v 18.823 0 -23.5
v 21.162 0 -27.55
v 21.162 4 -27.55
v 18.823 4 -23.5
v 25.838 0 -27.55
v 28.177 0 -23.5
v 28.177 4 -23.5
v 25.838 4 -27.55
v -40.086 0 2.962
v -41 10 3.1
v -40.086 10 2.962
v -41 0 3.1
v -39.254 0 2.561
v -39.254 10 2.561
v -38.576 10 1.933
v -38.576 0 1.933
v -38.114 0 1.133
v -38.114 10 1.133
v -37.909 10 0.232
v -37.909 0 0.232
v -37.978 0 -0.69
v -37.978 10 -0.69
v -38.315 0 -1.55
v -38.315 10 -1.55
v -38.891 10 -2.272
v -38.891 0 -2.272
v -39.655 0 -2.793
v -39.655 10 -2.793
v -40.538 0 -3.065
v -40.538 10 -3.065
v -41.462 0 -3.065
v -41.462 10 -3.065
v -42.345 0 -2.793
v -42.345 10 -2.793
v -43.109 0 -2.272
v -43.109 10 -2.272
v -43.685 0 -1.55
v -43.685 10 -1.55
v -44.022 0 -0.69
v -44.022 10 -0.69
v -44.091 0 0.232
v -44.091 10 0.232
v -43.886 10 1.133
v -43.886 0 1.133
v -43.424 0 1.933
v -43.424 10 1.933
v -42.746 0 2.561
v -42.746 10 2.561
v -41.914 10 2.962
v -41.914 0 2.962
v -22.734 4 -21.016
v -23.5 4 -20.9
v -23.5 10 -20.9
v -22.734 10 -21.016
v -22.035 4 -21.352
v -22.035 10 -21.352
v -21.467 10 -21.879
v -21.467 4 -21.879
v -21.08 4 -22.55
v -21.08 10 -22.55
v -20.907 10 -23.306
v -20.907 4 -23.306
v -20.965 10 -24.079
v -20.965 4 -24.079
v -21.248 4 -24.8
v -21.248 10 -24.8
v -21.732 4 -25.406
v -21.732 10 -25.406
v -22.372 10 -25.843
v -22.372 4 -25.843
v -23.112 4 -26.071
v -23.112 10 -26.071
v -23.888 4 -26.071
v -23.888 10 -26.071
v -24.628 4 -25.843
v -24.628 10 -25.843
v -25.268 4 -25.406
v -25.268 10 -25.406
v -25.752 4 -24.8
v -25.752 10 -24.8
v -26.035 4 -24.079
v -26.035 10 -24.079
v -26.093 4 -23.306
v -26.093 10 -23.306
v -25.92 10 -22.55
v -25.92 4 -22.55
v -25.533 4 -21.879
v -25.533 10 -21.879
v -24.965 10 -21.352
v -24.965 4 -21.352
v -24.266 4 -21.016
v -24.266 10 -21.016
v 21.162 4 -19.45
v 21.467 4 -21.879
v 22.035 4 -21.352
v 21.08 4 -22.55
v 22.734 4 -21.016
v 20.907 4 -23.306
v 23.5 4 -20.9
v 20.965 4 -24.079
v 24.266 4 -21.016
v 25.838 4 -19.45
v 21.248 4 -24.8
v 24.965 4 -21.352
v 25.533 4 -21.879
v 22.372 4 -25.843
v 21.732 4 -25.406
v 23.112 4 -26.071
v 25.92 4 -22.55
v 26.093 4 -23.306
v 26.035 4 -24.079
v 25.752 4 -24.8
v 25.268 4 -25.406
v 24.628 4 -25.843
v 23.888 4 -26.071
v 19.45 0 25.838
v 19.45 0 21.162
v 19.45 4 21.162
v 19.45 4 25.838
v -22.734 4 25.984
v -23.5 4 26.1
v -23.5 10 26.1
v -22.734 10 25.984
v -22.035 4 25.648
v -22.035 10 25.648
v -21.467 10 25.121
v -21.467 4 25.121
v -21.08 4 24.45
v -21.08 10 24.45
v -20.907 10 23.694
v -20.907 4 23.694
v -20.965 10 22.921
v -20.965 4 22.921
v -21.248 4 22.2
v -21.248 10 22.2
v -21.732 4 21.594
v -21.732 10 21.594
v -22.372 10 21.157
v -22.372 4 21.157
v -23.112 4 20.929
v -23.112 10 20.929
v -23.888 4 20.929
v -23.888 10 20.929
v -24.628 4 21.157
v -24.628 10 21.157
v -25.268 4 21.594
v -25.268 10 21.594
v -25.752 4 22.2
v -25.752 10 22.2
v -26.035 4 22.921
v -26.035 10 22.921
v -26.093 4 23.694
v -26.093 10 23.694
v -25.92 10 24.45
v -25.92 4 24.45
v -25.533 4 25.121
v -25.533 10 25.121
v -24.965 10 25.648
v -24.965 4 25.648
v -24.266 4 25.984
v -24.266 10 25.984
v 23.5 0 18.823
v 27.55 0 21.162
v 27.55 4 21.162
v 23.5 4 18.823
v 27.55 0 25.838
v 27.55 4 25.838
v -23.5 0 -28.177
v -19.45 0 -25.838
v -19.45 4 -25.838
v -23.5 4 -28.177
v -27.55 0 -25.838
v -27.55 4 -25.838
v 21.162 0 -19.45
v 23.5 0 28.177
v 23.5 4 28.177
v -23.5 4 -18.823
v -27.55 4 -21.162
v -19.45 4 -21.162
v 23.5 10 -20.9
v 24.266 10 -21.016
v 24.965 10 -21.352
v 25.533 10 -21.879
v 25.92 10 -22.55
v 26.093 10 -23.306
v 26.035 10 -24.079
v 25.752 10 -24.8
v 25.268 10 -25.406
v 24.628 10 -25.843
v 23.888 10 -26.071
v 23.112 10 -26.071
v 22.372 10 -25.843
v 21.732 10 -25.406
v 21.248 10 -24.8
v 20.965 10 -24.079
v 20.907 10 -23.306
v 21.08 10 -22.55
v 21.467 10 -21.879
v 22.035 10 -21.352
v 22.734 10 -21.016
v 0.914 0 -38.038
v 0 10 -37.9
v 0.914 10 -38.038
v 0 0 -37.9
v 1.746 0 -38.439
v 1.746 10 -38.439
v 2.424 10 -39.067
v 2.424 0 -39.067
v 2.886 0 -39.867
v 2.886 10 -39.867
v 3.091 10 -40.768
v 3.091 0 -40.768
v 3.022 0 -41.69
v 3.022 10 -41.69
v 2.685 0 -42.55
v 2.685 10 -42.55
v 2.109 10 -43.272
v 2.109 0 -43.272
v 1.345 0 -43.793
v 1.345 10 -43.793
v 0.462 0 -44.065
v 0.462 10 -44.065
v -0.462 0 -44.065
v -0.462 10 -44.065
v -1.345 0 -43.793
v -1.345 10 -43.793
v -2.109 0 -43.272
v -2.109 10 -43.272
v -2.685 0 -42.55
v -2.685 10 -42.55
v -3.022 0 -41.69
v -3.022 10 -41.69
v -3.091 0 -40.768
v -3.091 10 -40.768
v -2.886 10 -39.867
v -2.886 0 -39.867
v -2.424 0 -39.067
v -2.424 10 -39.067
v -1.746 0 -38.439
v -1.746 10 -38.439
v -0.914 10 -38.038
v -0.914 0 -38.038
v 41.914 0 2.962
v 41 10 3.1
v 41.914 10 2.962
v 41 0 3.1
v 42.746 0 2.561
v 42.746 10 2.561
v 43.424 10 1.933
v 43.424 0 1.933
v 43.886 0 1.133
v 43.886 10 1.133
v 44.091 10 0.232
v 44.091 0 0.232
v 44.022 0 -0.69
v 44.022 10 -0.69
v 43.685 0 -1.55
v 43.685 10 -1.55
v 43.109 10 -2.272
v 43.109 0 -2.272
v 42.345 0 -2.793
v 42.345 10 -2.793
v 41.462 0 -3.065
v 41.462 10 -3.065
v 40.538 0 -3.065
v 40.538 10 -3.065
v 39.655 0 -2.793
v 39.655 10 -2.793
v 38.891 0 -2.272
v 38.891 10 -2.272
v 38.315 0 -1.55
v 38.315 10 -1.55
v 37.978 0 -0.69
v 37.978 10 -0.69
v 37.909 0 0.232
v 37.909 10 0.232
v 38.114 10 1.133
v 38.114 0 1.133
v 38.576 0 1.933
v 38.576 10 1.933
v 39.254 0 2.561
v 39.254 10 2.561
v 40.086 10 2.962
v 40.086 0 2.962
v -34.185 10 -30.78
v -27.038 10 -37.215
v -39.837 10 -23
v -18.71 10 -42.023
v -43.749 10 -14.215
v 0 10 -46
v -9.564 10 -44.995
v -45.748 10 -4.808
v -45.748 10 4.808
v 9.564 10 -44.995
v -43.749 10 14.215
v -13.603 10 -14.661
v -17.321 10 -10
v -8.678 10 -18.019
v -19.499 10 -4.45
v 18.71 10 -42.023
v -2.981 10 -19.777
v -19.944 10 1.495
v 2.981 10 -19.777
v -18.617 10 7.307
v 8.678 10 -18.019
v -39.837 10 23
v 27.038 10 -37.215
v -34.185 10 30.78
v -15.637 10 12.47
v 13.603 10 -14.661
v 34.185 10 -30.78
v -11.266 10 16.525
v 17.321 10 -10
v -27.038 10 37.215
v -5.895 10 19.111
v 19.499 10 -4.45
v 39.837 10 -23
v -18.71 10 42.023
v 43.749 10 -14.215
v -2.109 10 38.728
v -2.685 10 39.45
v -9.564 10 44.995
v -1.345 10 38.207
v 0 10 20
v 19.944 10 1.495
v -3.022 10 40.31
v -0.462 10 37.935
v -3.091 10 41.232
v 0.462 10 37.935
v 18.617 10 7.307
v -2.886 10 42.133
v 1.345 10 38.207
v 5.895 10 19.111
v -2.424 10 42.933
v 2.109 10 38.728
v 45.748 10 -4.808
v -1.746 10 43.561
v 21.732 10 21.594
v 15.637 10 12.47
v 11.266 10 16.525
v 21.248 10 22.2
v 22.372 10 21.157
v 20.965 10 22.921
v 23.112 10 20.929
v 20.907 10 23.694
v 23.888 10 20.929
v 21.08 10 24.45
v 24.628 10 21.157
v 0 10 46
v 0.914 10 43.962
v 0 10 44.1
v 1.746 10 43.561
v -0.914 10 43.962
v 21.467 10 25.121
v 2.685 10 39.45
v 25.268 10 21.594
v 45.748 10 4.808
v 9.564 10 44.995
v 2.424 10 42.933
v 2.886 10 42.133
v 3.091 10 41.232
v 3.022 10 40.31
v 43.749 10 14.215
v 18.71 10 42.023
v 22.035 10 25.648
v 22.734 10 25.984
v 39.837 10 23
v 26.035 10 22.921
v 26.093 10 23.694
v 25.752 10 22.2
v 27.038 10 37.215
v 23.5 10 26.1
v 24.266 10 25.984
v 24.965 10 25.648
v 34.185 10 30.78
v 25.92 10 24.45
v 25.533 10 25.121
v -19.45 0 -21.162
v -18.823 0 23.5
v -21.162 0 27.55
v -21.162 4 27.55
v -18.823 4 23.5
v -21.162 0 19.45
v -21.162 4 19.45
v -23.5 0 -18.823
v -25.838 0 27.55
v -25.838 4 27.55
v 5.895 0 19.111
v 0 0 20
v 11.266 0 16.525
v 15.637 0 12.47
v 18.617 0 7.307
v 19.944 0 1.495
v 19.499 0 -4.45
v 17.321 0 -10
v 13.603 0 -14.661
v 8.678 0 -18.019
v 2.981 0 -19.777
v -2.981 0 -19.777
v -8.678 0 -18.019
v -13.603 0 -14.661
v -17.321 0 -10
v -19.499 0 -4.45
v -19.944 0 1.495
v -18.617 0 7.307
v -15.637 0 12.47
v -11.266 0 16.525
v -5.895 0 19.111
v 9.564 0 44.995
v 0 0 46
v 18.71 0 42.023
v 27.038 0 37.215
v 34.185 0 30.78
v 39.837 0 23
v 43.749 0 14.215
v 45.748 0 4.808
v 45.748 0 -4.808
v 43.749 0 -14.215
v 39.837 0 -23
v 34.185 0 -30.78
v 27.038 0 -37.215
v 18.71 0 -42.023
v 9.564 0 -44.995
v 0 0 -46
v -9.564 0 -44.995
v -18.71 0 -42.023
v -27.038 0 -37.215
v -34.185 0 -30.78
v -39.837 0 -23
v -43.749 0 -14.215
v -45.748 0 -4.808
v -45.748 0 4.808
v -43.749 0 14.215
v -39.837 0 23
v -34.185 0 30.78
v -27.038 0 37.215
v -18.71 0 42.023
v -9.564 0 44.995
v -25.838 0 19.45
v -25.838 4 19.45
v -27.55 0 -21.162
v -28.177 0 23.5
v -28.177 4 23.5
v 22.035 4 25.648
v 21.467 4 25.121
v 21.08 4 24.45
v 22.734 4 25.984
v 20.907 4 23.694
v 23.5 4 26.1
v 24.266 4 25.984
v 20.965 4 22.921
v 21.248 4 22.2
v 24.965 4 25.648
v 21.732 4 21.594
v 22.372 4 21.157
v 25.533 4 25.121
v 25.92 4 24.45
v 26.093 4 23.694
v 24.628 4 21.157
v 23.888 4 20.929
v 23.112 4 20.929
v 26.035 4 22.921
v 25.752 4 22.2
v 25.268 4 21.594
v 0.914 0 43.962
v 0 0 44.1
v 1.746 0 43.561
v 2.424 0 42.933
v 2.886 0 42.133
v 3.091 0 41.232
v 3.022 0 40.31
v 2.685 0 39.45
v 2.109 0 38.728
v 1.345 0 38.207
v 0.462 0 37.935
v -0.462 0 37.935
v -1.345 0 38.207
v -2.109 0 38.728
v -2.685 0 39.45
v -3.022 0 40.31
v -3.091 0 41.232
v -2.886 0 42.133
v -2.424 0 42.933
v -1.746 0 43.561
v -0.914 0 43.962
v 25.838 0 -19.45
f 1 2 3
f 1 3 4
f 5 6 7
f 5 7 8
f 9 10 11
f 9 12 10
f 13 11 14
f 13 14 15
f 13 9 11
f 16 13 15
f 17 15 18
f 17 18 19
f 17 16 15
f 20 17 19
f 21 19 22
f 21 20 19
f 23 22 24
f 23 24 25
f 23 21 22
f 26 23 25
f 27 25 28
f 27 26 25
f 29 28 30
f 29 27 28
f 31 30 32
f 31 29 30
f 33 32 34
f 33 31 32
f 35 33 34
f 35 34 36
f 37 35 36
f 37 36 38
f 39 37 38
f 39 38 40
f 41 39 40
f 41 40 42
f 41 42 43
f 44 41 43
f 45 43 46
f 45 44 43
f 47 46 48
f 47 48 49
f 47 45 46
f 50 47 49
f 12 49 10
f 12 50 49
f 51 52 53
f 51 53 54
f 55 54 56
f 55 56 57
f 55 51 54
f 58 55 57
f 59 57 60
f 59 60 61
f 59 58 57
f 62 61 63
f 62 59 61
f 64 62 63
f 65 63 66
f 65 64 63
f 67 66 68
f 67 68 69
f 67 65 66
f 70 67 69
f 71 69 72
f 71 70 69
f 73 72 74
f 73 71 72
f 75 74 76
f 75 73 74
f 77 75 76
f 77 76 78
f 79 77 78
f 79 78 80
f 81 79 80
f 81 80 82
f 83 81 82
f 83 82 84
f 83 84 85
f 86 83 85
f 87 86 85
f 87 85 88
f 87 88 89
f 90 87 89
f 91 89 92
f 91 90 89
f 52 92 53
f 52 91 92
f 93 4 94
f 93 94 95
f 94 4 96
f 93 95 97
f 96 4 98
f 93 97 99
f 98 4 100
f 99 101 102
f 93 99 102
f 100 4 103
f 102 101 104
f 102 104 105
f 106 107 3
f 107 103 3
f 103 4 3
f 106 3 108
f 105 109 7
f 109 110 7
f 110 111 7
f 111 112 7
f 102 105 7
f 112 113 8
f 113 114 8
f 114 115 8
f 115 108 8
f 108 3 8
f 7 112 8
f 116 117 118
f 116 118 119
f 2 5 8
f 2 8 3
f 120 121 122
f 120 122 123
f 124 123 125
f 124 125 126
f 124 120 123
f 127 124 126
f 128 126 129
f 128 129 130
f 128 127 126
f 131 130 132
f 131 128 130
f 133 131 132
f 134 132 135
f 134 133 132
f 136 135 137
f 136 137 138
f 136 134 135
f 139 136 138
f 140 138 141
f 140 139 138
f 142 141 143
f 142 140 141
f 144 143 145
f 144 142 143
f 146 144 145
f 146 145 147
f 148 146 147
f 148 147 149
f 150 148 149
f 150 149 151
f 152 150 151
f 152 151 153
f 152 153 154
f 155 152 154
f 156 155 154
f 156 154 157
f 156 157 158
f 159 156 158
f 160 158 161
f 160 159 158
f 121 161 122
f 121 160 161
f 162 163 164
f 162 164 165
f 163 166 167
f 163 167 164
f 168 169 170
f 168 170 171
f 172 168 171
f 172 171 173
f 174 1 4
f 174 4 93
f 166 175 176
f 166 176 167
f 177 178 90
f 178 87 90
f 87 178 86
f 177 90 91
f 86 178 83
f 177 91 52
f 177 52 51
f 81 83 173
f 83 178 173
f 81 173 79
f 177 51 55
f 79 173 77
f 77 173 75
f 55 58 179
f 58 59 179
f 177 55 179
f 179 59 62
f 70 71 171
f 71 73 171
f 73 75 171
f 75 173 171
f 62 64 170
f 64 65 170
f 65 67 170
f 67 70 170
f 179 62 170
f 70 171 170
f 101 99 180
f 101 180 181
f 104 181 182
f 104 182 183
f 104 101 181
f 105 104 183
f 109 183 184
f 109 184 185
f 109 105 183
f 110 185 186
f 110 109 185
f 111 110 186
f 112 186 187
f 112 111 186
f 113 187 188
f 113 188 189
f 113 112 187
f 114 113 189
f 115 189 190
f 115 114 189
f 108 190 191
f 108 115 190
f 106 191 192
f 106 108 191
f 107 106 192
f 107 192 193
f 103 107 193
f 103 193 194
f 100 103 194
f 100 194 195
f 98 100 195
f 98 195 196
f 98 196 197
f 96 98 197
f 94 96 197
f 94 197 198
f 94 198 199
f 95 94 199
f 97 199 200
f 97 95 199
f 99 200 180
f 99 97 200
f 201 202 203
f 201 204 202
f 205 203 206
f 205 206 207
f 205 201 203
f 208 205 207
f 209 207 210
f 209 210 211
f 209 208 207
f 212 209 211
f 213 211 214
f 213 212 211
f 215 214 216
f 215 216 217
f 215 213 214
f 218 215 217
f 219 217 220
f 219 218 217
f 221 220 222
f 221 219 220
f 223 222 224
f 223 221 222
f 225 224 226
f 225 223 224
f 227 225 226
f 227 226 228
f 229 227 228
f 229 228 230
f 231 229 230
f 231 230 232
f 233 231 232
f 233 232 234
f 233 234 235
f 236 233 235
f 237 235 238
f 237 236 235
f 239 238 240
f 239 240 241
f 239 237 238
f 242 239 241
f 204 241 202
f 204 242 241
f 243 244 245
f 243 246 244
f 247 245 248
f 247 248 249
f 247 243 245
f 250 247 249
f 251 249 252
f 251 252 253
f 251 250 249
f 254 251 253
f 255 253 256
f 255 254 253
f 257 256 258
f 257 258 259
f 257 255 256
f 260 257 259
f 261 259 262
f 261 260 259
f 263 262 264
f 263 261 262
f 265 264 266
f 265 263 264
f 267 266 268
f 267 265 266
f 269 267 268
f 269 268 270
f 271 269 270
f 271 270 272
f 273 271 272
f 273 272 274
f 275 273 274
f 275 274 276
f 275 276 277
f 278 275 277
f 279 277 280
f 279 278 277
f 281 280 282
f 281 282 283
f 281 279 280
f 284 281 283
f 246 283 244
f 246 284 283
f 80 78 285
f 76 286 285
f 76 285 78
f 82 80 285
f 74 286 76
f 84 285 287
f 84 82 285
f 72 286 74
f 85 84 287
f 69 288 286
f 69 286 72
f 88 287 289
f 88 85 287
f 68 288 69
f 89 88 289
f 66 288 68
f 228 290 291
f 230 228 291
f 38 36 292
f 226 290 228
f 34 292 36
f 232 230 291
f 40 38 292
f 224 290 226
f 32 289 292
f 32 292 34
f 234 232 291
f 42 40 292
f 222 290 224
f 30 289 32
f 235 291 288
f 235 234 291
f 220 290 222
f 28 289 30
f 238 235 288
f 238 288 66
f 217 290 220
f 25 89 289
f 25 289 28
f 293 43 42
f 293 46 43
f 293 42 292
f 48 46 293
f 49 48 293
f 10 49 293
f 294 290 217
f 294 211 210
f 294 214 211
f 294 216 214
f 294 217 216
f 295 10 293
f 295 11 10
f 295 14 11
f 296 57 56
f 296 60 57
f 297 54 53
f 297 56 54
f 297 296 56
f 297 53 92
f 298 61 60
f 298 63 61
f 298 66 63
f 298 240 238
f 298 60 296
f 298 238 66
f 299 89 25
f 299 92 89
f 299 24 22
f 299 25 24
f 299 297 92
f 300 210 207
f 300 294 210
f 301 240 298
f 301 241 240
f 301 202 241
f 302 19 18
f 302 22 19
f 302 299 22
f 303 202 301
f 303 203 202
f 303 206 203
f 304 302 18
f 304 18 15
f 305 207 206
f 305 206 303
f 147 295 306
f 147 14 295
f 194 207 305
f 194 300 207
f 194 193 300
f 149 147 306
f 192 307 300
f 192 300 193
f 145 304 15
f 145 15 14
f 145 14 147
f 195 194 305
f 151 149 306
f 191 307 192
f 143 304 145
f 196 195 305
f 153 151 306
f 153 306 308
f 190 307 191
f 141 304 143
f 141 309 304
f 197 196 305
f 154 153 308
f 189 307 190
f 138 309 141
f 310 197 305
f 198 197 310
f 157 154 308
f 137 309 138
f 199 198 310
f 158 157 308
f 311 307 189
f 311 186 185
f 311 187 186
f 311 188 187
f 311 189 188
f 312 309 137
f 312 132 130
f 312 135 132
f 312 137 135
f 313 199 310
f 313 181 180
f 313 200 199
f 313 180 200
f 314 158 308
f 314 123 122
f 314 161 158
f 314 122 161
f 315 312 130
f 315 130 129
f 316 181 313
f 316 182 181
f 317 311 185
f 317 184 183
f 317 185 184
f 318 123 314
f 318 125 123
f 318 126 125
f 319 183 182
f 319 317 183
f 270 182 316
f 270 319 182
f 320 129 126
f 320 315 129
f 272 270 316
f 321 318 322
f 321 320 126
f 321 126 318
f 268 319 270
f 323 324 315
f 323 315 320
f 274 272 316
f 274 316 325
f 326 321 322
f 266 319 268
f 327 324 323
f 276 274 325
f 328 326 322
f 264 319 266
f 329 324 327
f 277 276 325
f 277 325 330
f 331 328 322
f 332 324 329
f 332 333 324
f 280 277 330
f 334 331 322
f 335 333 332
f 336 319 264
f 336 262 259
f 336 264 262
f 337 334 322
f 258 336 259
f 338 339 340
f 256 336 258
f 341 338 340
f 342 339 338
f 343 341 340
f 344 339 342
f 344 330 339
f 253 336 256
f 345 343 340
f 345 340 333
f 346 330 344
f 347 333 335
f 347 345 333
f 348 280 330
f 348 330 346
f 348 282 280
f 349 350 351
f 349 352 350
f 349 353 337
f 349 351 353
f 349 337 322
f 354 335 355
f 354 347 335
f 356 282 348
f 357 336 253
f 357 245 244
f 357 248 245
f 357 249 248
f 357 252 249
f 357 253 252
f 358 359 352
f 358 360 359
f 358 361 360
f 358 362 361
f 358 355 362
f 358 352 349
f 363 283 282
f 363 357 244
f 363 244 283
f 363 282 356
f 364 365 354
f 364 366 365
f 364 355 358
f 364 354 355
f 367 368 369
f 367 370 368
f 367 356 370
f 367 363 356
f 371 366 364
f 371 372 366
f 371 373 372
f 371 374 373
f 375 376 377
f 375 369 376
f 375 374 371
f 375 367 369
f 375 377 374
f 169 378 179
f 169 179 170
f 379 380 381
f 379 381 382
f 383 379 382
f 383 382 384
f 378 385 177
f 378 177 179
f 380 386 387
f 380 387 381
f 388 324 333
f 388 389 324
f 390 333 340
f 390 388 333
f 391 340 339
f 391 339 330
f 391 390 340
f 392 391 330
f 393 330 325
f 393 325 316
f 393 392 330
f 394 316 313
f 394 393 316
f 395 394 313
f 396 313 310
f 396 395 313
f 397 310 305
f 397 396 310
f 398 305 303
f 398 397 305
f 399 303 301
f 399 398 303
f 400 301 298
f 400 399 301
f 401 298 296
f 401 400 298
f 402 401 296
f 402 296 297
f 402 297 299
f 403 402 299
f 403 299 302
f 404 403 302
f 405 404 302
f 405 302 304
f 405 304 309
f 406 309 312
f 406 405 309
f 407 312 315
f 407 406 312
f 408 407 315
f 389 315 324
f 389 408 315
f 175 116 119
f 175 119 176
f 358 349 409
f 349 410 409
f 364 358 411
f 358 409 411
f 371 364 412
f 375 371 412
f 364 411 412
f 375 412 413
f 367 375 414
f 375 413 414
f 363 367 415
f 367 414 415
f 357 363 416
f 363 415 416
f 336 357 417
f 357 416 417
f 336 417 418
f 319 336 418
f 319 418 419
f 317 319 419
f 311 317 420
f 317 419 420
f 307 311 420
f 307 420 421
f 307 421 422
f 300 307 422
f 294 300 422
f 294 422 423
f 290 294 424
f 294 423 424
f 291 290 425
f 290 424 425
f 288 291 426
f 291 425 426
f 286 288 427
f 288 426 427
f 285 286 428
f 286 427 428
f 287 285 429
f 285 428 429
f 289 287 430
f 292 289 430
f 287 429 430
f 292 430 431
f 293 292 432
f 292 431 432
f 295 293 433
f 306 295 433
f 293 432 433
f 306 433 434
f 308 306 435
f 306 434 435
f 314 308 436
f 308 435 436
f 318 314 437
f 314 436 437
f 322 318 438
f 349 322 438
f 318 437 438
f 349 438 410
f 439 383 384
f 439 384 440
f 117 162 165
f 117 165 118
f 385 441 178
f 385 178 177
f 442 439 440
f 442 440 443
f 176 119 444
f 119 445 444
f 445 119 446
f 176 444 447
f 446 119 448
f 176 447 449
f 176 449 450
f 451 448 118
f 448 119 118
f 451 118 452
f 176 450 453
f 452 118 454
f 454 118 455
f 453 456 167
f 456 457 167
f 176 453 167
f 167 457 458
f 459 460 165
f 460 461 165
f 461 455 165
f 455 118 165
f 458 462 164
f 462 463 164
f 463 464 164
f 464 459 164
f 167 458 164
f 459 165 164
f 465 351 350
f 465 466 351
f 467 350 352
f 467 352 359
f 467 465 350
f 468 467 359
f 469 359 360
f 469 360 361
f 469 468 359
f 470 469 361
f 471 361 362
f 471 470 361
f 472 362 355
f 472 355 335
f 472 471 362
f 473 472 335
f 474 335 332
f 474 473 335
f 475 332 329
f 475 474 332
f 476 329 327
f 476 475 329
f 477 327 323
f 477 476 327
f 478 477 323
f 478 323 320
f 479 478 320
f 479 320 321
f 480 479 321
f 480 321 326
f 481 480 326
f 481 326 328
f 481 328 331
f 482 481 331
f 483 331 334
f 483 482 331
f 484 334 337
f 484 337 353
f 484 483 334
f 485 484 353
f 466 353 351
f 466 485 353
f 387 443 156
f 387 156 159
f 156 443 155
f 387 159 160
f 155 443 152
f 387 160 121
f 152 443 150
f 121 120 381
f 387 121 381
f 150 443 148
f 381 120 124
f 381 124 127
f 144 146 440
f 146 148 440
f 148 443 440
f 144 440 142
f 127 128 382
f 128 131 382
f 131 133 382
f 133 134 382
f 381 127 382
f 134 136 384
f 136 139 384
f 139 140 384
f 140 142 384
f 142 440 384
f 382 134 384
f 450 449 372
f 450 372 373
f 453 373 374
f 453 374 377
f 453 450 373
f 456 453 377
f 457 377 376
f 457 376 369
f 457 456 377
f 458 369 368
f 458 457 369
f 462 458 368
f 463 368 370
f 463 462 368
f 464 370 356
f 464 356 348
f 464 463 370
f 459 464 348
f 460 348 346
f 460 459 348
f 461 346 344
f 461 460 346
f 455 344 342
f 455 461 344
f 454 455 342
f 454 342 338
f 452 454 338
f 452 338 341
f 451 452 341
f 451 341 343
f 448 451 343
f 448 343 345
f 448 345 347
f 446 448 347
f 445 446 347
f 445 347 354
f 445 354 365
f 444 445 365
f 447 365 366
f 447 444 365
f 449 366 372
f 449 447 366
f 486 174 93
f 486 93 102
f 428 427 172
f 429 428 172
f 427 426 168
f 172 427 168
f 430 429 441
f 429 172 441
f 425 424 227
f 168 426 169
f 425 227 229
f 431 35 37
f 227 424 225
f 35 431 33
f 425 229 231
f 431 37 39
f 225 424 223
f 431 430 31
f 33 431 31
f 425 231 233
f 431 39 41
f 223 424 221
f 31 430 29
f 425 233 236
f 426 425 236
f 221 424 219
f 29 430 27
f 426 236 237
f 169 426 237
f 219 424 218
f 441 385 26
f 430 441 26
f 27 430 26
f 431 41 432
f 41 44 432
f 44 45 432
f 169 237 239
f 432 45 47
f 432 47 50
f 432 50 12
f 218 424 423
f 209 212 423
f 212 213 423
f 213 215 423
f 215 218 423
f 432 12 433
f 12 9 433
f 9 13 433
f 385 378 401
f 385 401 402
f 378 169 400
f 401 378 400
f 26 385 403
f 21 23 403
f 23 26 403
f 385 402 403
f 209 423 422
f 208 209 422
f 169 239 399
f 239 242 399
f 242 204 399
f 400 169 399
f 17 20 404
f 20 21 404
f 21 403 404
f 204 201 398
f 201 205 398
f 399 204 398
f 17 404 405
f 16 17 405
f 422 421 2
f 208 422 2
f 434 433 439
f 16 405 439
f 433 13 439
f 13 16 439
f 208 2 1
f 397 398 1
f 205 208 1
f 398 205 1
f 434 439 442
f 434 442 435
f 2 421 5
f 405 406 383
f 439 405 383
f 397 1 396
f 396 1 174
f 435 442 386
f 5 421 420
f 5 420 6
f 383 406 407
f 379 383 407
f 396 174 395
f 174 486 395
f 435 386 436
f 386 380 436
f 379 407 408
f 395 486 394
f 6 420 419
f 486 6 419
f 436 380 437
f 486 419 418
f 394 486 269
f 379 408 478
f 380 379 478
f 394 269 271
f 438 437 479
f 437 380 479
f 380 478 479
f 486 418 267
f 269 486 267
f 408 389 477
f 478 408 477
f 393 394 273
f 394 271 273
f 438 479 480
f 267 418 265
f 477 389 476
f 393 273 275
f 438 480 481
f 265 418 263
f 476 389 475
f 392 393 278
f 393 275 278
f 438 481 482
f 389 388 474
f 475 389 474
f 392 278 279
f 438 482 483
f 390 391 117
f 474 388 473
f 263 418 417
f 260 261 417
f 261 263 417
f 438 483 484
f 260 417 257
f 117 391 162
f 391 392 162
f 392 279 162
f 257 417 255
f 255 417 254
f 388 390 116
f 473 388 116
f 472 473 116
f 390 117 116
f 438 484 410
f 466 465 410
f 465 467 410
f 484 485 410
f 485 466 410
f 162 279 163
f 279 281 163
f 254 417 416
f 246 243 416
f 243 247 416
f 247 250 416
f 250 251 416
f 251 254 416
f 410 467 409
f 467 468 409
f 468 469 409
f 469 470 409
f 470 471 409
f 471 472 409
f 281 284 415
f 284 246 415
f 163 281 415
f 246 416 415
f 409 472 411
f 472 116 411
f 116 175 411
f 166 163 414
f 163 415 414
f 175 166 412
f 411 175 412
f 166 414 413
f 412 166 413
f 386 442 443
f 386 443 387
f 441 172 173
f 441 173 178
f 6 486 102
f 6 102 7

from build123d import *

# Parameters (mm, degrees)
SKETCH_1_R      = 46
SKETCH_1_R_2    = 20
SKETCH_1_R_3    = 3.1
EXTRUDE_1_DEPTH = 4
EXTRUDE_START   = 4
SKETCH_1_8_R    = 46
SKETCH_1_8_R_2  = 3.1
SKETCH_1_8_R_3  = 20
SKETCH_1_8_R_4  = 2.6
EXTRUDE_3_DEPTH = 6


with BuildPart() as part:
    # 草图1 → 凸台-拉伸1 (new body)
    with BuildSketch(Plane(origin=(0, 0, 0), x_dir=(1, 0, 0), z_dir=(0, 1, 0))):
        with Locations(Location((0, 0, 0), (0, 0, 270))):
            Circle(SKETCH_1_R)
        with Locations(Location((0, 0, 0), (0, 0, 270))):
            Circle(SKETCH_1_R_2, mode=Mode.SUBTRACT)
        with Locations(Location((0, 41, 0), (0, 0, 270))):
            Circle(SKETCH_1_R_3, mode=Mode.SUBTRACT)
        with Locations(Location((41, 0, 0), (0, 0, 270))):
            Circle(SKETCH_1_R_3, mode=Mode.SUBTRACT)
        with Locations(Location((0, -41, 0), (0, 0, 270))):
            Circle(SKETCH_1_R_3, mode=Mode.SUBTRACT)
        with Locations(Location((-41, 0, 0), (0, 0, 270))):
            Circle(SKETCH_1_R_3, mode=Mode.SUBTRACT)
        Polygon((-19.45, 21.16173141), (-19.45, 25.83826859), (-23.5, 28.17653718), (-27.55, 25.83826859), (-27.55, 21.16173141), (-23.5, 18.82346282), align=None, mode=Mode.SUBTRACT)
        Polygon((21.16173141, 19.45), (25.83826859, 19.45), (28.17653718, 23.5), (25.83826859, 27.55), (21.16173141, 27.55), (18.82346282, 23.5), align=None, mode=Mode.SUBTRACT)
        Polygon((19.45, -21.16173141), (19.45, -25.83826859), (23.5, -28.17653718), (27.55, -25.83826859), (27.55, -21.16173141), (23.5, -18.82346282), align=None, mode=Mode.SUBTRACT)
        Polygon((-21.16173141, -19.45), (-25.83826859, -19.45), (-28.17653718, -23.5), (-25.83826859, -27.55), (-21.16173141, -27.55), (-18.82346282, -23.5), align=None, mode=Mode.SUBTRACT)
    extrude(amount=EXTRUDE_1_DEPTH)

    # 草图1<8> → 凸台-拉伸3 (add)
    # profile 1 of 5: a face of its own
    with BuildSketch(Plane(origin=(0, 0, 0), x_dir=(1, 0, 0), z_dir=(0, 1, 0)).offset(EXTRUDE_START)):
        with Locations(Location((0, 0, 0), (0, 0, 270))):
            Circle(SKETCH_1_8_R)
        with Locations(Location((-41, 0, 0), (0, 0, 270))):
            Circle(SKETCH_1_8_R_2, mode=Mode.SUBTRACT)
        with Locations(Location((0, -41, 0), (0, 0, 270))):
            Circle(SKETCH_1_8_R_2, mode=Mode.SUBTRACT)
        with Locations(Location((41, 0, 0), (0, 0, 270))):
            Circle(SKETCH_1_8_R_2, mode=Mode.SUBTRACT)
        with Locations(Location((0, 41, 0), (0, 0, 270))):
            Circle(SKETCH_1_8_R_2, mode=Mode.SUBTRACT)
        with Locations(Location((0, 0, 0), (0, 0, 270))):
            Circle(SKETCH_1_8_R_3, mode=Mode.SUBTRACT)
        Polygon((-23.5, 18.82346282), (-19.45, 21.16173141), (-19.45, 25.83826859), (-23.5, 28.17653718), (-27.55, 25.83826859), (-27.55, 21.16173141), align=None, mode=Mode.SUBTRACT)
        Polygon((18.82346282, 23.5), (21.16173141, 19.45), (25.83826859, 19.45), (28.17653718, 23.5), (25.83826859, 27.55), (21.16173141, 27.55), align=None, mode=Mode.SUBTRACT)
        Polygon((23.5, -18.82346282), (19.45, -21.16173141), (19.45, -25.83826859), (23.5, -28.17653718), (27.55, -25.83826859), (27.55, -21.16173141), align=None, mode=Mode.SUBTRACT)
        Polygon((-18.82346282, -23.5), (-21.16173141, -19.45), (-25.83826859, -19.45), (-28.17653718, -23.5), (-25.83826859, -27.55), (-21.16173141, -27.55), align=None, mode=Mode.SUBTRACT)
    # profile 2 of 5: a face of its own
    with BuildSketch(Plane(origin=(0, 0, 0), x_dir=(1, 0, 0), z_dir=(0, 1, 0)).offset(EXTRUDE_START)):
        Polygon((-21.16173141, -27.55), (-18.82346282, -23.5), (-21.16173141, -19.45), (-25.83826859, -19.45), (-28.17653718, -23.5), (-25.83826859, -27.55), align=None)
        with Locations(Location((-23.5, -23.5, 0), (0, 0, 270))):
            Circle(SKETCH_1_8_R_4, mode=Mode.SUBTRACT)
    # profile 3 of 5: a face of its own
    with BuildSketch(Plane(origin=(0, 0, 0), x_dir=(1, 0, 0), z_dir=(0, 1, 0)).offset(EXTRUDE_START)):
        Polygon((27.55, -21.16173141), (23.5, -18.82346282), (19.45, -21.16173141), (19.45, -25.83826859), (23.5, -28.17653718), (27.55, -25.83826859), align=None)
        with Locations(Location((23.5, -23.5, 0), (0, 0, 270))):
            Circle(SKETCH_1_8_R_4, mode=Mode.SUBTRACT)
    # profile 4 of 5: a face of its own
    with BuildSketch(Plane(origin=(0, 0, 0), x_dir=(1, 0, 0), z_dir=(0, 1, 0)).offset(EXTRUDE_START)):
        Polygon((21.16173141, 27.55), (18.82346282, 23.5), (21.16173141, 19.45), (25.83826859, 19.45), (28.17653718, 23.5), (25.83826859, 27.55), align=None)
        with Locations(Location((23.5, 23.5, 0), (0, 0, 270))):
            Circle(SKETCH_1_8_R_4, mode=Mode.SUBTRACT)
    # profile 5 of 5: a face of its own
    with BuildSketch(Plane(origin=(0, 0, 0), x_dir=(1, 0, 0), z_dir=(0, 1, 0)).offset(EXTRUDE_START)):
        Polygon((-27.55, 21.16173141), (-23.5, 18.82346282), (-19.45, 21.16173141), (-19.45, 25.83826859), (-23.5, 28.17653718), (-27.55, 25.83826859), align=None)
        with Locations(Location((-23.5, 23.5, 0), (0, 0, 270))):
            Circle(SKETCH_1_8_R_4, mode=Mode.SUBTRACT)
    extrude(amount=EXTRUDE_3_DEPTH)


solid = part.part
